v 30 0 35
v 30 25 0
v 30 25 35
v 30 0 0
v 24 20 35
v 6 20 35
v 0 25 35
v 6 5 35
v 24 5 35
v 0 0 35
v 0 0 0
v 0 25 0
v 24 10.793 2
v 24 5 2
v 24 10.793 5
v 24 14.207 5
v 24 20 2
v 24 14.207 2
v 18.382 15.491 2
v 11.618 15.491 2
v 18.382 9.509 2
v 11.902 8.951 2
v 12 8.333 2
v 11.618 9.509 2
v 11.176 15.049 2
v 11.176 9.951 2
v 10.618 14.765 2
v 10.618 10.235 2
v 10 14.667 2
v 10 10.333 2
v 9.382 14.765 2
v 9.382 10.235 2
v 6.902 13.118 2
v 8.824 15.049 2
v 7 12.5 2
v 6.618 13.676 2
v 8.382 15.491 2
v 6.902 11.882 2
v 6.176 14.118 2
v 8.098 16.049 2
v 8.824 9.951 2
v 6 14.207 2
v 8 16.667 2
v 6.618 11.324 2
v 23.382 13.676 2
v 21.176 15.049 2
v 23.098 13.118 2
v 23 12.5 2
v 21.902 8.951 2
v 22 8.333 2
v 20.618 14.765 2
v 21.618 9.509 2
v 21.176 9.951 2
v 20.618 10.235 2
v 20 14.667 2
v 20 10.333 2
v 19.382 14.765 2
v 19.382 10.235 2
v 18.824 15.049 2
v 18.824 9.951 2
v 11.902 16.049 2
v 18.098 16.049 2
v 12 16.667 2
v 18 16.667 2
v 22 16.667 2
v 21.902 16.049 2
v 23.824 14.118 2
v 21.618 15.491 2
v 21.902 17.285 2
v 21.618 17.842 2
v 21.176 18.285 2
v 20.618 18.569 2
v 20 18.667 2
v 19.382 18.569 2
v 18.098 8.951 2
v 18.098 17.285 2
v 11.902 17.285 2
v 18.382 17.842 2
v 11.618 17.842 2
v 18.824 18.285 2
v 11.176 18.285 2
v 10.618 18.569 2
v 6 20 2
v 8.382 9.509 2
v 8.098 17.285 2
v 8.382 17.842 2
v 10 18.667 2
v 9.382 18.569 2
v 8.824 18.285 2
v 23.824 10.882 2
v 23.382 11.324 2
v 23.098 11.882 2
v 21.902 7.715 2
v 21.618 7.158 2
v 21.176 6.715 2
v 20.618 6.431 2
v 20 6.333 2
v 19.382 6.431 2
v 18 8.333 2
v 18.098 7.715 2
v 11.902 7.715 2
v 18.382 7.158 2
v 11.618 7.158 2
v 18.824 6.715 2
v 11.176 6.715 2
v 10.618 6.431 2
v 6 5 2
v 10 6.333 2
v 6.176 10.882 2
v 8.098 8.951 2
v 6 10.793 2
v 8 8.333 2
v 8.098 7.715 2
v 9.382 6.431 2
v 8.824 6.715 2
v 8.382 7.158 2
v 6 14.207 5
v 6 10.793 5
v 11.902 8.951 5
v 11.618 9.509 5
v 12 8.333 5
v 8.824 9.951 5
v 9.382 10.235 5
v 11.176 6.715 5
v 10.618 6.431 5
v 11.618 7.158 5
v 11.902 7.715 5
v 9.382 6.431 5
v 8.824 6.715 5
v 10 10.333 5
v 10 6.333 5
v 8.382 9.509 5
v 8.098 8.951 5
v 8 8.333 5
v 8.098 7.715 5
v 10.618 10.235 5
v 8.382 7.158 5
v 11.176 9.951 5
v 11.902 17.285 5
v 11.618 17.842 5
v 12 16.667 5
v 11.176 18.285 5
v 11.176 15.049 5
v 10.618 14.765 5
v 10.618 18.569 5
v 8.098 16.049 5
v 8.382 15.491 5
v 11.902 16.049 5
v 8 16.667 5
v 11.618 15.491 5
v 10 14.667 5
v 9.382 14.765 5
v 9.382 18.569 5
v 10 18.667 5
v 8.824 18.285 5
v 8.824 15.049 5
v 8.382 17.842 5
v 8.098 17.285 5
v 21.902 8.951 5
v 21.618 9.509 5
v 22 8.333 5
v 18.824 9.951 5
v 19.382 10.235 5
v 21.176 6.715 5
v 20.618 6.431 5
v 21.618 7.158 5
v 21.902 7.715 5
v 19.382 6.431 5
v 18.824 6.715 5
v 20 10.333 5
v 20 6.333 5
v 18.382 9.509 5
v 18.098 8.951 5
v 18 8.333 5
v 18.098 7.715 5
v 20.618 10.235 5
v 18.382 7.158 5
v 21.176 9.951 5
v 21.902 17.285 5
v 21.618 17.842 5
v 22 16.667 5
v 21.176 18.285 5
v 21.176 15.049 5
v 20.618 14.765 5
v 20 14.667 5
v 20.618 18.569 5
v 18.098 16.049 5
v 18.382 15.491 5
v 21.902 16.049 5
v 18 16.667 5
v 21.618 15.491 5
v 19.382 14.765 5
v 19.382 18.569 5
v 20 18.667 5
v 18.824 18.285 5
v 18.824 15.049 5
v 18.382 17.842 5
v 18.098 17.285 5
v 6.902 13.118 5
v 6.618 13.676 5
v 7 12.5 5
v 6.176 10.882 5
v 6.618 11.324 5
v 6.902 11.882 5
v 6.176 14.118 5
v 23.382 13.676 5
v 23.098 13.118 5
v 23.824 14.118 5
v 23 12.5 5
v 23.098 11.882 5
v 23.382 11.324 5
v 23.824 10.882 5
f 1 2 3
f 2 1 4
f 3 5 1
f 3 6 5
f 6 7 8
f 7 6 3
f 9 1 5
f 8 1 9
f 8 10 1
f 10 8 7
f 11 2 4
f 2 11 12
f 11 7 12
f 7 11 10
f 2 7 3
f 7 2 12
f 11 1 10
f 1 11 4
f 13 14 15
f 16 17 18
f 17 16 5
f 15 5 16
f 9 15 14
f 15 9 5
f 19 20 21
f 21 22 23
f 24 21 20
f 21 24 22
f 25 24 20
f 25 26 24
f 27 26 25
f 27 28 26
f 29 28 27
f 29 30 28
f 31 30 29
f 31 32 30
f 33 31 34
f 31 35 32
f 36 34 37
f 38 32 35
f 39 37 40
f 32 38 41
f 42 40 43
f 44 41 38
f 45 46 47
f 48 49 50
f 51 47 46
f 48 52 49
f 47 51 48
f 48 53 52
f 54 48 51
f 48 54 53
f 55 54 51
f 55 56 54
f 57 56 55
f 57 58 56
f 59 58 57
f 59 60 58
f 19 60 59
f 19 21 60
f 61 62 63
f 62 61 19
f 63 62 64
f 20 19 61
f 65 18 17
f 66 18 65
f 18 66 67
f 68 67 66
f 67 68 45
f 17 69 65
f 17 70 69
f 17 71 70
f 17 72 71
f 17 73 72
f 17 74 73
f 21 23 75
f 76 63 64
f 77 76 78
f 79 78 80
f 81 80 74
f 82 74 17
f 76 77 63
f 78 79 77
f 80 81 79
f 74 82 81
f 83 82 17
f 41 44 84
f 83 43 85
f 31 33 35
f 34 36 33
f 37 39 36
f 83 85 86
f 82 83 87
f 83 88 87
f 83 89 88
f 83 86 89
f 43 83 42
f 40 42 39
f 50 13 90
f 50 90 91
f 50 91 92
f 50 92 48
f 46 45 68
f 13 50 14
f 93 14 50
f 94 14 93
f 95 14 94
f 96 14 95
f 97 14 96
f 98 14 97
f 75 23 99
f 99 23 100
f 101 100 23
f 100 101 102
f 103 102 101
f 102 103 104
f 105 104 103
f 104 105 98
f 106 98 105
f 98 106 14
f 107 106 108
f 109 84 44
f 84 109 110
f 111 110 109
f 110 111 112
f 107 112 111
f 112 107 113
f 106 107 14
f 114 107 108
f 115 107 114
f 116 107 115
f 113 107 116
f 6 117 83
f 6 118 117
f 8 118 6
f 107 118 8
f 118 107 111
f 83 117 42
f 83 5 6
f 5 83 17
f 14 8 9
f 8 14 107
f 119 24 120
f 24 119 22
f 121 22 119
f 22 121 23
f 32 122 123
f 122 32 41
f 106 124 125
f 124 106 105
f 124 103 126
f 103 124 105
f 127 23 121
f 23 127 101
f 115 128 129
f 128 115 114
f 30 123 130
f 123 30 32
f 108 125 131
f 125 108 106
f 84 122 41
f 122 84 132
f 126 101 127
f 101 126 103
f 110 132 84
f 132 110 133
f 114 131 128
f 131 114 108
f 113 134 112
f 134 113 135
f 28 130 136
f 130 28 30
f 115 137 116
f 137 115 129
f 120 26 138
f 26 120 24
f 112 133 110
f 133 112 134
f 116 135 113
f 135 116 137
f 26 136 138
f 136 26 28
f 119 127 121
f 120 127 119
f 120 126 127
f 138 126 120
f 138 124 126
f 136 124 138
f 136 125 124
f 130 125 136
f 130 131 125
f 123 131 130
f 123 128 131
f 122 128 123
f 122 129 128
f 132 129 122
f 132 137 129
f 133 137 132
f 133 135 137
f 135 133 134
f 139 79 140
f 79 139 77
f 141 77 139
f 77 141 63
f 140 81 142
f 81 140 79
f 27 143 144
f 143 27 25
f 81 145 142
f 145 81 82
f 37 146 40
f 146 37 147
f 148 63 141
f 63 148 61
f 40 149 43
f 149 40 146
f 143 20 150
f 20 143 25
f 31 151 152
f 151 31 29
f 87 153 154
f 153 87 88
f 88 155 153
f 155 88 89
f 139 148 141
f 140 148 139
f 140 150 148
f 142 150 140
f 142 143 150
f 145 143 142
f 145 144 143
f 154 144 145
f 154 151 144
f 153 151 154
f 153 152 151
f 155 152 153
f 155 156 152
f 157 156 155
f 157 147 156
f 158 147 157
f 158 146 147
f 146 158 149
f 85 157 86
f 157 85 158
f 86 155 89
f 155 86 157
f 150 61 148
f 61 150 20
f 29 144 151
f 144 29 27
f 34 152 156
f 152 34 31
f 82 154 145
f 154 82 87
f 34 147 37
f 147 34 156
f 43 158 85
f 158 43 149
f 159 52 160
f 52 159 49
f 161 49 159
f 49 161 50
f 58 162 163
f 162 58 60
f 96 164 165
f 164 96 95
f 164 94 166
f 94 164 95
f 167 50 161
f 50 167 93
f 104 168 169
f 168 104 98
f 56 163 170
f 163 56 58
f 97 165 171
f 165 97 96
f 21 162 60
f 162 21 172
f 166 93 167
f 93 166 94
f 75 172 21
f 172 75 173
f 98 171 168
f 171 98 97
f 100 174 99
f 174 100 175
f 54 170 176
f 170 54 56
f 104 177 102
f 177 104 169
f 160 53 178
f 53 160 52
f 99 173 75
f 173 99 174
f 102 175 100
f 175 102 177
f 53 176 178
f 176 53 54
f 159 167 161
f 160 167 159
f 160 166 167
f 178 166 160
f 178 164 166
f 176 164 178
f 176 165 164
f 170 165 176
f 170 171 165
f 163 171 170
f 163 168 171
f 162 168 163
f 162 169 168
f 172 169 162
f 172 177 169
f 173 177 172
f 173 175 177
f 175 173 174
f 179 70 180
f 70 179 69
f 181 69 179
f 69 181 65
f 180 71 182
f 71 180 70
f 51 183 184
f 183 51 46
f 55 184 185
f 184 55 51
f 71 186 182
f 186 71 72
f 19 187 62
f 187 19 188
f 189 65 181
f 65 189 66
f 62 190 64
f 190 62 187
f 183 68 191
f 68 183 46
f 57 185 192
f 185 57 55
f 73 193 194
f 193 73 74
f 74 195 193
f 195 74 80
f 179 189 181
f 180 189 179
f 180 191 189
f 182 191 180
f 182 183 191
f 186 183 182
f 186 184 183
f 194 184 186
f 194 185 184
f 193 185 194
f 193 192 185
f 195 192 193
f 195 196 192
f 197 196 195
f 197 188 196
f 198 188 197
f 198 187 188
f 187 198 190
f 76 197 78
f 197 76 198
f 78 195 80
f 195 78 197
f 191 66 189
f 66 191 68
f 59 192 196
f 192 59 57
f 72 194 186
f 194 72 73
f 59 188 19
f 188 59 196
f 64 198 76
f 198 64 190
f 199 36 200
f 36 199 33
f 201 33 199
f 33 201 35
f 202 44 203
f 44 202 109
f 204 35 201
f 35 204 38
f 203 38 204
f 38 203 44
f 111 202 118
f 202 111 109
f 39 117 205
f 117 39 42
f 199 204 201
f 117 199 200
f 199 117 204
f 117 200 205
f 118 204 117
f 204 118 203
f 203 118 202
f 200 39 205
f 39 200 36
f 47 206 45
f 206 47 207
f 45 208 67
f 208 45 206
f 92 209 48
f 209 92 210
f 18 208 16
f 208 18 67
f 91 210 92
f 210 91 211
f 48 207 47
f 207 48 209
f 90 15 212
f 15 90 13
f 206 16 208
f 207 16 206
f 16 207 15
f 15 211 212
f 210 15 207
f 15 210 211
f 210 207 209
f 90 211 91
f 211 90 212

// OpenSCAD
/* 
 * Tool End Holder Generator
 * Holds various tool ends and bits
 * Compatible with toolgrid-generator.scad peg hole pattern
 */

/* [Display Mode] */
print_mode = "single"; // [single, multi_row]

/* [Grid Integration] */
hole_center_spacing = 9.5; // [8:12] - Must match toolgrid generator
pin_hole_diameter = 4.2; // [3:8] - Must match toolgrid generator

/* [Housing Dimensions] */
housing_width = 30; // [20:50]
housing_height = 25; // [15:40]
housing_depth = 35; // [25:60]

/* [Pin Configuration] */
pin_diameter = 4.0; // [3:6]
num_pins_x = 2; // [1:4]
num_pins_y = 2; // [1:4]

/* [Rotation] */
holder_rotation = 0; // [0:360]

/* [Wall Thickness] */
wall_thickness = 3; // [2:5]
floor_thickness = 2; // [1:4]

/* [Advanced] */
pin_offset_from_edge = 3; // [1:8]
fillet_radius = 1; // [0:3]

// ===== CALCULATED PARAMETERS =====
pin_spacing_x = housing_width / (num_pins_x + 1);
pin_spacing_y = housing_height / (num_pins_y + 1);

// ===== MAIN MODULES =====

module holder_base() {
    difference() {
        cube([housing_width, housing_height, housing_depth]);
        
        translate([
            (housing_width * 0.2),
            (housing_height * 0.2),
            floor_thickness
        ]) {
            cube([housing_width * 0.6, housing_height * 0.6, housing_depth]);
        }
        
        for (x = [1:num_pins_x]) {
            for (y = [1:num_pins_y]) {
                pin_x = x * pin_spacing_x;
                pin_y = y * pin_spacing_y;
                translate([pin_x, pin_y, pin_offset_from_edge]) {
                    cylinder(d=pin_diameter, h=housing_depth, $fn=20);
                }
            }
        }
    }
    
    for (x = [1:num_pins_x]) {
        for (y = [1:num_pins_y]) {
            pin_x = x * pin_spacing_x;
            pin_y = y * pin_spacing_y;
            translate([pin_x, pin_y, 0]) {
                cylinder(d=pin_diameter, h=pin_offset_from_edge + pin_diameter/2, $fn=20);
            }
        }
    }
}

module mounting_pegs() {
    peg_diameter = pin_hole_diameter - 0.2;
    peg_height = 5;
    
    translate([pin_diameter/2 + wall_thickness, housing_height/2, 0]) {
        cylinder(d=peg_diameter, h=peg_height, $fn=20);
    }
    translate([housing_width - wall_thickness - pin_diameter/2, housing_height/2, 0]) {
        cylinder(d=peg_diameter, h=peg_height, $fn=20);
    }
}

module complete_holder() {
    translate([housing_width/2, housing_height/2, 0]) {
        rotate([0, 0, holder_rotation]) {
            translate([-housing_width/2, -housing_height/2, 0]) {
                holder_base();
            }
        }
    }
    mounting_pegs();
}

// ===== GENERATION =====

if (print_mode == "single") {
    complete_holder();
} else if (print_mode == "multi_row") {
    spacing = hole_center_spacing * 2.5;
    for (i = [0:3]) {
        translate([i * spacing, 0, 0]) {
            complete_holder();
        }
    }
}

// ===== DEBUG OUTPUT =====
echo("=== Tool End Holder Generator ===");
echo("Housing: ", housing_width, "×", housing_height, "×", housing_depth, "mm");
echo("Support pins: ", num_pins_x, "×", num_pins_y);
echo("Rotation: ", holder_rotation, "°");
